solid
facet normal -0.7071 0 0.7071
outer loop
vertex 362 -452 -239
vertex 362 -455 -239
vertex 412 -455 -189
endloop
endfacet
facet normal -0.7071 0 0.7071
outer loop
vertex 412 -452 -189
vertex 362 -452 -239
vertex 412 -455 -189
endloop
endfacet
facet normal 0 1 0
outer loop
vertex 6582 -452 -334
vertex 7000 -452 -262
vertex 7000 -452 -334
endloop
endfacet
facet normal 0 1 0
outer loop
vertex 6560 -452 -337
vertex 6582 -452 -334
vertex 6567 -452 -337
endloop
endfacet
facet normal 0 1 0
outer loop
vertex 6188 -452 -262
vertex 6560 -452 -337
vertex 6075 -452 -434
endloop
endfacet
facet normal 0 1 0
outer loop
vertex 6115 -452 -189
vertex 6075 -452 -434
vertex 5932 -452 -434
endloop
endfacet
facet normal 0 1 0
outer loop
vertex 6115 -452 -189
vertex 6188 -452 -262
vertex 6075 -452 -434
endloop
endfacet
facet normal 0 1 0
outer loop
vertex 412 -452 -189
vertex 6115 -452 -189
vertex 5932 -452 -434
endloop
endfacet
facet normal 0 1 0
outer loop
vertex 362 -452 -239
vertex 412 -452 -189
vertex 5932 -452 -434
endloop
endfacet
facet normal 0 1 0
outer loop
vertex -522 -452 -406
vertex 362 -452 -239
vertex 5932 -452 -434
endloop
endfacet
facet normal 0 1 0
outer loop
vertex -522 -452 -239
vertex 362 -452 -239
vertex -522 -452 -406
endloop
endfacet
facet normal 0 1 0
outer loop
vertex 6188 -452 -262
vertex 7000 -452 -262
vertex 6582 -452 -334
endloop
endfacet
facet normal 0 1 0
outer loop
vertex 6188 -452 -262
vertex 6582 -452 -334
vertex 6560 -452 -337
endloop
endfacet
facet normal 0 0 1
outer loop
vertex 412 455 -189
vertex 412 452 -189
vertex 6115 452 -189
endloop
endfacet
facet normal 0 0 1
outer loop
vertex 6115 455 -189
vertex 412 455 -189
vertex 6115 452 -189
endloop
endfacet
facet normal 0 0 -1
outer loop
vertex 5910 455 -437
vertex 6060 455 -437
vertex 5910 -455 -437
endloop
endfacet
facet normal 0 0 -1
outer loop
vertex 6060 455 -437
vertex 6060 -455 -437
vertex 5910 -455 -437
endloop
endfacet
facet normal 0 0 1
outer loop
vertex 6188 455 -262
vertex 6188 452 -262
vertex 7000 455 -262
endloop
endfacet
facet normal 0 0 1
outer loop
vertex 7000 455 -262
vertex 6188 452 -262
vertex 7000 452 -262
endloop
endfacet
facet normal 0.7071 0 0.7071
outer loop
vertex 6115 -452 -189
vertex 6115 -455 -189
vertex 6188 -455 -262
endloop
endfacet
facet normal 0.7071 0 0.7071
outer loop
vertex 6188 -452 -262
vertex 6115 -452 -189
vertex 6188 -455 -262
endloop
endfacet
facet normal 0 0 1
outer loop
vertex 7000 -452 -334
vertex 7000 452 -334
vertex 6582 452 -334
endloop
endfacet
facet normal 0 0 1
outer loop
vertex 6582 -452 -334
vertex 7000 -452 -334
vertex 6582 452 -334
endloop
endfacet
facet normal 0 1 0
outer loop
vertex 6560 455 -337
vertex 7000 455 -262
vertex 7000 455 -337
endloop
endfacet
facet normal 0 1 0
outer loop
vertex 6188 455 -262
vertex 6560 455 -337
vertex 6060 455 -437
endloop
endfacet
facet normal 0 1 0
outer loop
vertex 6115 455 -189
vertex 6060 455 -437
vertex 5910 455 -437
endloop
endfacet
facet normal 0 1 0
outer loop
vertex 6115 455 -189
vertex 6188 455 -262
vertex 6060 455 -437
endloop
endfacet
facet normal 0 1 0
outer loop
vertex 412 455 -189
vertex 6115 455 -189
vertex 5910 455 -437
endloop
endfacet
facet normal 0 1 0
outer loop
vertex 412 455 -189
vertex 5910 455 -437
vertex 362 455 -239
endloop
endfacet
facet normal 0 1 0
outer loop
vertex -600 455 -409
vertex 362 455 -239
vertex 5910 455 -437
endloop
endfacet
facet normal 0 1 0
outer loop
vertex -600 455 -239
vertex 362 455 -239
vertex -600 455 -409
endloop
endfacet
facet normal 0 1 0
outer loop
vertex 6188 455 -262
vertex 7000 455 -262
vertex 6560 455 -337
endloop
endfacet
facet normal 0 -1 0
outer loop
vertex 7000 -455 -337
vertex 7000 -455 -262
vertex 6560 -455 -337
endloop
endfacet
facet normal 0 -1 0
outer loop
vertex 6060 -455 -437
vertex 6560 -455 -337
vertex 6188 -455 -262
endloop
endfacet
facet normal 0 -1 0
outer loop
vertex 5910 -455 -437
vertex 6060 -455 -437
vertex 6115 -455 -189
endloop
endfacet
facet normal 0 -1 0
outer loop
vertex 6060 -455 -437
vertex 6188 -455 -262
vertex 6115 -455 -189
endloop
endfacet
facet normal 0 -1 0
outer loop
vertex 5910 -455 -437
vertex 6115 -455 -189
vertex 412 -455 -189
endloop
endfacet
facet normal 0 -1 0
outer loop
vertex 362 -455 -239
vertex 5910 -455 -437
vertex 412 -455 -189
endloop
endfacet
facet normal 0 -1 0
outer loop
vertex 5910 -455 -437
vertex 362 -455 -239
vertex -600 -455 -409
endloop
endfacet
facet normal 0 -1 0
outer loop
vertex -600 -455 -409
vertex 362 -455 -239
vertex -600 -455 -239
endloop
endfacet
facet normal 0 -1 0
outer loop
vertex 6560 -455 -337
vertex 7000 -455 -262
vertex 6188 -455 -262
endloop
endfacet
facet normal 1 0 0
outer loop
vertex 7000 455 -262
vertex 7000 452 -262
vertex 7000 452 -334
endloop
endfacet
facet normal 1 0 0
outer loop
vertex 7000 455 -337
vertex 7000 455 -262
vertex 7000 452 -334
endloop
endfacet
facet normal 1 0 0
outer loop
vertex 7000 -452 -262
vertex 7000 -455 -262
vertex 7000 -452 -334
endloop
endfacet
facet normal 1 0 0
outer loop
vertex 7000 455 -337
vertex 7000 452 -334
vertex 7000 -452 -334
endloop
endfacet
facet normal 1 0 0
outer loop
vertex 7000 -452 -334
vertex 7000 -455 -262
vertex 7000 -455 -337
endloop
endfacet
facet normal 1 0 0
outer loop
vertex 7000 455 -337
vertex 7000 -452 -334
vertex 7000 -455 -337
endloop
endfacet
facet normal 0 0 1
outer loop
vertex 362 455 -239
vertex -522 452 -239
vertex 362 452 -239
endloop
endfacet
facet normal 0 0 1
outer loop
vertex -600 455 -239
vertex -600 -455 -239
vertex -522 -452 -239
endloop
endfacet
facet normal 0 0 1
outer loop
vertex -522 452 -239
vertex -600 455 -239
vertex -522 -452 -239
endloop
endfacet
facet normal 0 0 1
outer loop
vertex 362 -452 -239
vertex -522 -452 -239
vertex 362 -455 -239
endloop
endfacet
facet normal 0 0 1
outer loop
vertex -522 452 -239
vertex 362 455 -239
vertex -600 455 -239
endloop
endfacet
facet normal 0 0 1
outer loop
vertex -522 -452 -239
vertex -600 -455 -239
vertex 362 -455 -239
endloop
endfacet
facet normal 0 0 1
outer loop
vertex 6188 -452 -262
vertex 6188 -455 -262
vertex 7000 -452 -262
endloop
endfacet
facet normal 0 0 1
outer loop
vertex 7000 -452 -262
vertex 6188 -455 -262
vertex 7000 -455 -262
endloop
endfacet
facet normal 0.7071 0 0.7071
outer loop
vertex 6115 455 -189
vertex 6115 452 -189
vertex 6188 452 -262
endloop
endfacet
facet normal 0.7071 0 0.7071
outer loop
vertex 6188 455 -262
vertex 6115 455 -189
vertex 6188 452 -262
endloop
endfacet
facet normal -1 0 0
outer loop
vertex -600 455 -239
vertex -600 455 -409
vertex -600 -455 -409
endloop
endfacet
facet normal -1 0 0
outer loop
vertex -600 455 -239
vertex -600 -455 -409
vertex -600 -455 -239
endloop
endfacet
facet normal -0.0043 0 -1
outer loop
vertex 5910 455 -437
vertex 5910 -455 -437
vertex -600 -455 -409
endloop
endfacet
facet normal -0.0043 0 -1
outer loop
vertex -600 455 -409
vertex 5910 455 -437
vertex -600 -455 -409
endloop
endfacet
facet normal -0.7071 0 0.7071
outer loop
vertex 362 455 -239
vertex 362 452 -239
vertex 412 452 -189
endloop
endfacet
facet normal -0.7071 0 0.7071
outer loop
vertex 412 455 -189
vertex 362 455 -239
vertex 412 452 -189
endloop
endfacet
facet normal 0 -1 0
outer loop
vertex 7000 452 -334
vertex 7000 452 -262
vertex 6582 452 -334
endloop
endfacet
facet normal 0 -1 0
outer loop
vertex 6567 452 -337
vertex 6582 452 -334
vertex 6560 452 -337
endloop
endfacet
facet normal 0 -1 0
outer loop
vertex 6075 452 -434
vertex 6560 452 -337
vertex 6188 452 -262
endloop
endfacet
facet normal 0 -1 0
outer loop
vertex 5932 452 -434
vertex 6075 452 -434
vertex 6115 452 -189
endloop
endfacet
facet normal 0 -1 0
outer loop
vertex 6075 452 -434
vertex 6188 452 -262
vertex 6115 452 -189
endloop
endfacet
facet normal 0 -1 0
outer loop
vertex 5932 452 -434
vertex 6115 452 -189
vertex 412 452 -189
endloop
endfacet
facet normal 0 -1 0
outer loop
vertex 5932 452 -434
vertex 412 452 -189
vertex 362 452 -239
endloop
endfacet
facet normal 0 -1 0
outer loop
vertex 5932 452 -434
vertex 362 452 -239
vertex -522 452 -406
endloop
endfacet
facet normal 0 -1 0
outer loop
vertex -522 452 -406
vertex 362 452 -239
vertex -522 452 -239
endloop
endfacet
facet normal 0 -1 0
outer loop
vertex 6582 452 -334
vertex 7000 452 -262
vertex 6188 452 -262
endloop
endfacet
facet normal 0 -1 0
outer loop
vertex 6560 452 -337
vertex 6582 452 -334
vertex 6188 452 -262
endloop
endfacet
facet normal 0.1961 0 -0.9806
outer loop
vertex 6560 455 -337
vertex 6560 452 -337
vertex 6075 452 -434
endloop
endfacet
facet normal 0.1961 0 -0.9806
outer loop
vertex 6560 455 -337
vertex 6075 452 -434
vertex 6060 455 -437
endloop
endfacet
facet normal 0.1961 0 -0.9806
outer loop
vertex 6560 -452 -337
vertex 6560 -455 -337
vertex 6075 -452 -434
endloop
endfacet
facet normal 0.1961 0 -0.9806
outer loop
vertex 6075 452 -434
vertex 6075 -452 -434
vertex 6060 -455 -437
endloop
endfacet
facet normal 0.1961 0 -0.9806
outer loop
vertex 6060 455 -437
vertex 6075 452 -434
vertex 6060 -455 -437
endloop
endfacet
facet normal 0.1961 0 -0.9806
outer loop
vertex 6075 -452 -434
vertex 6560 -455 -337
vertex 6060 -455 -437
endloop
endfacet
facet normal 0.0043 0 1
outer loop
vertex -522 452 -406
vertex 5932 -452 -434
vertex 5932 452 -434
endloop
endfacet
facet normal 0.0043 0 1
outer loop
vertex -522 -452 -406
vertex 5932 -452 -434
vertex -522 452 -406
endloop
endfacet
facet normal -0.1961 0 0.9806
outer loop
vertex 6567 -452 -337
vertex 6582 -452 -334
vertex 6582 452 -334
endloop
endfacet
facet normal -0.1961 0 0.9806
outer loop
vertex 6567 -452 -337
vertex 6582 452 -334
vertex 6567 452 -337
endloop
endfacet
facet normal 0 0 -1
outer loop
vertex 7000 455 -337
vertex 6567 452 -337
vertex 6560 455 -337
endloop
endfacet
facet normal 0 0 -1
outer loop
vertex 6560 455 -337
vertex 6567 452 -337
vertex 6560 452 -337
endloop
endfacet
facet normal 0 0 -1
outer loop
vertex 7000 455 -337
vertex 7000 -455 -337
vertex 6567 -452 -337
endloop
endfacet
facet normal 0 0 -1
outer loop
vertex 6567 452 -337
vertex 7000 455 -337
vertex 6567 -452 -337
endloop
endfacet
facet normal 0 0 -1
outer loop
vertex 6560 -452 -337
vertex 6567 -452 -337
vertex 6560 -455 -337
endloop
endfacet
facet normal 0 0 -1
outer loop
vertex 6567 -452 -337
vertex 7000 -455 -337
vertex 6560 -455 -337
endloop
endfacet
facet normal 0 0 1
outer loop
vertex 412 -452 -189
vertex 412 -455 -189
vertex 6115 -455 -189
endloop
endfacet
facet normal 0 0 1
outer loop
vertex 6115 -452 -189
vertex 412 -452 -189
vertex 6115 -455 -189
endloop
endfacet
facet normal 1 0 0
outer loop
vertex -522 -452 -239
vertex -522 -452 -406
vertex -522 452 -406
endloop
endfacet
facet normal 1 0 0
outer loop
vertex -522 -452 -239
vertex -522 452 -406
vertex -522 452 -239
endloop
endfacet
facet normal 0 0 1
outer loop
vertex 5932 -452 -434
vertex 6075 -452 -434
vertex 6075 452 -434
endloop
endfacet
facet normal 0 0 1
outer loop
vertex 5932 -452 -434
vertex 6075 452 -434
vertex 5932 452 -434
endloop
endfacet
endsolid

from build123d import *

# Parameters (mm, degrees)
EXTRUDE031_DEPTH = 452
EXTRUDE015_DEPTH = 455


with BuildPart() as extrude031:
    # Sketch032 → Extrude031 (new body, symmetric)
    with BuildSketch(Plane.XZ):
        Polygon((-522, -239), (362, -239), (422, -179), (6104, -179), (6187, -262), (7022, -262), (7022, -337), (6582, -337), (6082, -437), (5932, -437), (-522, -409), align=None)
    extrude(amount=EXTRUDE031_DEPTH, both=True)


with BuildPart() as extrude031_1:
    # Extrude031 placement: moved
    add(extrude031.part.moved(Location((0, 0, 3))))


with BuildPart() as cut:
    # Sketch023 → Extrude015 (new body, symmetric)
    with BuildSketch(Plane.XZ):
        Polygon((-600, -239), (362, -239), (412, -189), (6115, -189), (6188, -262), (7000, -262), (7000, -337), (6560, -337), (6060, -437), (5910, -437), (-600, -409), align=None)
    extrude(amount=EXTRUDE015_DEPTH, both=True)

    # Cut: cut Extrude031
    add(extrude031_1.part, mode=Mode.SUBTRACT)


solid = cut.part
